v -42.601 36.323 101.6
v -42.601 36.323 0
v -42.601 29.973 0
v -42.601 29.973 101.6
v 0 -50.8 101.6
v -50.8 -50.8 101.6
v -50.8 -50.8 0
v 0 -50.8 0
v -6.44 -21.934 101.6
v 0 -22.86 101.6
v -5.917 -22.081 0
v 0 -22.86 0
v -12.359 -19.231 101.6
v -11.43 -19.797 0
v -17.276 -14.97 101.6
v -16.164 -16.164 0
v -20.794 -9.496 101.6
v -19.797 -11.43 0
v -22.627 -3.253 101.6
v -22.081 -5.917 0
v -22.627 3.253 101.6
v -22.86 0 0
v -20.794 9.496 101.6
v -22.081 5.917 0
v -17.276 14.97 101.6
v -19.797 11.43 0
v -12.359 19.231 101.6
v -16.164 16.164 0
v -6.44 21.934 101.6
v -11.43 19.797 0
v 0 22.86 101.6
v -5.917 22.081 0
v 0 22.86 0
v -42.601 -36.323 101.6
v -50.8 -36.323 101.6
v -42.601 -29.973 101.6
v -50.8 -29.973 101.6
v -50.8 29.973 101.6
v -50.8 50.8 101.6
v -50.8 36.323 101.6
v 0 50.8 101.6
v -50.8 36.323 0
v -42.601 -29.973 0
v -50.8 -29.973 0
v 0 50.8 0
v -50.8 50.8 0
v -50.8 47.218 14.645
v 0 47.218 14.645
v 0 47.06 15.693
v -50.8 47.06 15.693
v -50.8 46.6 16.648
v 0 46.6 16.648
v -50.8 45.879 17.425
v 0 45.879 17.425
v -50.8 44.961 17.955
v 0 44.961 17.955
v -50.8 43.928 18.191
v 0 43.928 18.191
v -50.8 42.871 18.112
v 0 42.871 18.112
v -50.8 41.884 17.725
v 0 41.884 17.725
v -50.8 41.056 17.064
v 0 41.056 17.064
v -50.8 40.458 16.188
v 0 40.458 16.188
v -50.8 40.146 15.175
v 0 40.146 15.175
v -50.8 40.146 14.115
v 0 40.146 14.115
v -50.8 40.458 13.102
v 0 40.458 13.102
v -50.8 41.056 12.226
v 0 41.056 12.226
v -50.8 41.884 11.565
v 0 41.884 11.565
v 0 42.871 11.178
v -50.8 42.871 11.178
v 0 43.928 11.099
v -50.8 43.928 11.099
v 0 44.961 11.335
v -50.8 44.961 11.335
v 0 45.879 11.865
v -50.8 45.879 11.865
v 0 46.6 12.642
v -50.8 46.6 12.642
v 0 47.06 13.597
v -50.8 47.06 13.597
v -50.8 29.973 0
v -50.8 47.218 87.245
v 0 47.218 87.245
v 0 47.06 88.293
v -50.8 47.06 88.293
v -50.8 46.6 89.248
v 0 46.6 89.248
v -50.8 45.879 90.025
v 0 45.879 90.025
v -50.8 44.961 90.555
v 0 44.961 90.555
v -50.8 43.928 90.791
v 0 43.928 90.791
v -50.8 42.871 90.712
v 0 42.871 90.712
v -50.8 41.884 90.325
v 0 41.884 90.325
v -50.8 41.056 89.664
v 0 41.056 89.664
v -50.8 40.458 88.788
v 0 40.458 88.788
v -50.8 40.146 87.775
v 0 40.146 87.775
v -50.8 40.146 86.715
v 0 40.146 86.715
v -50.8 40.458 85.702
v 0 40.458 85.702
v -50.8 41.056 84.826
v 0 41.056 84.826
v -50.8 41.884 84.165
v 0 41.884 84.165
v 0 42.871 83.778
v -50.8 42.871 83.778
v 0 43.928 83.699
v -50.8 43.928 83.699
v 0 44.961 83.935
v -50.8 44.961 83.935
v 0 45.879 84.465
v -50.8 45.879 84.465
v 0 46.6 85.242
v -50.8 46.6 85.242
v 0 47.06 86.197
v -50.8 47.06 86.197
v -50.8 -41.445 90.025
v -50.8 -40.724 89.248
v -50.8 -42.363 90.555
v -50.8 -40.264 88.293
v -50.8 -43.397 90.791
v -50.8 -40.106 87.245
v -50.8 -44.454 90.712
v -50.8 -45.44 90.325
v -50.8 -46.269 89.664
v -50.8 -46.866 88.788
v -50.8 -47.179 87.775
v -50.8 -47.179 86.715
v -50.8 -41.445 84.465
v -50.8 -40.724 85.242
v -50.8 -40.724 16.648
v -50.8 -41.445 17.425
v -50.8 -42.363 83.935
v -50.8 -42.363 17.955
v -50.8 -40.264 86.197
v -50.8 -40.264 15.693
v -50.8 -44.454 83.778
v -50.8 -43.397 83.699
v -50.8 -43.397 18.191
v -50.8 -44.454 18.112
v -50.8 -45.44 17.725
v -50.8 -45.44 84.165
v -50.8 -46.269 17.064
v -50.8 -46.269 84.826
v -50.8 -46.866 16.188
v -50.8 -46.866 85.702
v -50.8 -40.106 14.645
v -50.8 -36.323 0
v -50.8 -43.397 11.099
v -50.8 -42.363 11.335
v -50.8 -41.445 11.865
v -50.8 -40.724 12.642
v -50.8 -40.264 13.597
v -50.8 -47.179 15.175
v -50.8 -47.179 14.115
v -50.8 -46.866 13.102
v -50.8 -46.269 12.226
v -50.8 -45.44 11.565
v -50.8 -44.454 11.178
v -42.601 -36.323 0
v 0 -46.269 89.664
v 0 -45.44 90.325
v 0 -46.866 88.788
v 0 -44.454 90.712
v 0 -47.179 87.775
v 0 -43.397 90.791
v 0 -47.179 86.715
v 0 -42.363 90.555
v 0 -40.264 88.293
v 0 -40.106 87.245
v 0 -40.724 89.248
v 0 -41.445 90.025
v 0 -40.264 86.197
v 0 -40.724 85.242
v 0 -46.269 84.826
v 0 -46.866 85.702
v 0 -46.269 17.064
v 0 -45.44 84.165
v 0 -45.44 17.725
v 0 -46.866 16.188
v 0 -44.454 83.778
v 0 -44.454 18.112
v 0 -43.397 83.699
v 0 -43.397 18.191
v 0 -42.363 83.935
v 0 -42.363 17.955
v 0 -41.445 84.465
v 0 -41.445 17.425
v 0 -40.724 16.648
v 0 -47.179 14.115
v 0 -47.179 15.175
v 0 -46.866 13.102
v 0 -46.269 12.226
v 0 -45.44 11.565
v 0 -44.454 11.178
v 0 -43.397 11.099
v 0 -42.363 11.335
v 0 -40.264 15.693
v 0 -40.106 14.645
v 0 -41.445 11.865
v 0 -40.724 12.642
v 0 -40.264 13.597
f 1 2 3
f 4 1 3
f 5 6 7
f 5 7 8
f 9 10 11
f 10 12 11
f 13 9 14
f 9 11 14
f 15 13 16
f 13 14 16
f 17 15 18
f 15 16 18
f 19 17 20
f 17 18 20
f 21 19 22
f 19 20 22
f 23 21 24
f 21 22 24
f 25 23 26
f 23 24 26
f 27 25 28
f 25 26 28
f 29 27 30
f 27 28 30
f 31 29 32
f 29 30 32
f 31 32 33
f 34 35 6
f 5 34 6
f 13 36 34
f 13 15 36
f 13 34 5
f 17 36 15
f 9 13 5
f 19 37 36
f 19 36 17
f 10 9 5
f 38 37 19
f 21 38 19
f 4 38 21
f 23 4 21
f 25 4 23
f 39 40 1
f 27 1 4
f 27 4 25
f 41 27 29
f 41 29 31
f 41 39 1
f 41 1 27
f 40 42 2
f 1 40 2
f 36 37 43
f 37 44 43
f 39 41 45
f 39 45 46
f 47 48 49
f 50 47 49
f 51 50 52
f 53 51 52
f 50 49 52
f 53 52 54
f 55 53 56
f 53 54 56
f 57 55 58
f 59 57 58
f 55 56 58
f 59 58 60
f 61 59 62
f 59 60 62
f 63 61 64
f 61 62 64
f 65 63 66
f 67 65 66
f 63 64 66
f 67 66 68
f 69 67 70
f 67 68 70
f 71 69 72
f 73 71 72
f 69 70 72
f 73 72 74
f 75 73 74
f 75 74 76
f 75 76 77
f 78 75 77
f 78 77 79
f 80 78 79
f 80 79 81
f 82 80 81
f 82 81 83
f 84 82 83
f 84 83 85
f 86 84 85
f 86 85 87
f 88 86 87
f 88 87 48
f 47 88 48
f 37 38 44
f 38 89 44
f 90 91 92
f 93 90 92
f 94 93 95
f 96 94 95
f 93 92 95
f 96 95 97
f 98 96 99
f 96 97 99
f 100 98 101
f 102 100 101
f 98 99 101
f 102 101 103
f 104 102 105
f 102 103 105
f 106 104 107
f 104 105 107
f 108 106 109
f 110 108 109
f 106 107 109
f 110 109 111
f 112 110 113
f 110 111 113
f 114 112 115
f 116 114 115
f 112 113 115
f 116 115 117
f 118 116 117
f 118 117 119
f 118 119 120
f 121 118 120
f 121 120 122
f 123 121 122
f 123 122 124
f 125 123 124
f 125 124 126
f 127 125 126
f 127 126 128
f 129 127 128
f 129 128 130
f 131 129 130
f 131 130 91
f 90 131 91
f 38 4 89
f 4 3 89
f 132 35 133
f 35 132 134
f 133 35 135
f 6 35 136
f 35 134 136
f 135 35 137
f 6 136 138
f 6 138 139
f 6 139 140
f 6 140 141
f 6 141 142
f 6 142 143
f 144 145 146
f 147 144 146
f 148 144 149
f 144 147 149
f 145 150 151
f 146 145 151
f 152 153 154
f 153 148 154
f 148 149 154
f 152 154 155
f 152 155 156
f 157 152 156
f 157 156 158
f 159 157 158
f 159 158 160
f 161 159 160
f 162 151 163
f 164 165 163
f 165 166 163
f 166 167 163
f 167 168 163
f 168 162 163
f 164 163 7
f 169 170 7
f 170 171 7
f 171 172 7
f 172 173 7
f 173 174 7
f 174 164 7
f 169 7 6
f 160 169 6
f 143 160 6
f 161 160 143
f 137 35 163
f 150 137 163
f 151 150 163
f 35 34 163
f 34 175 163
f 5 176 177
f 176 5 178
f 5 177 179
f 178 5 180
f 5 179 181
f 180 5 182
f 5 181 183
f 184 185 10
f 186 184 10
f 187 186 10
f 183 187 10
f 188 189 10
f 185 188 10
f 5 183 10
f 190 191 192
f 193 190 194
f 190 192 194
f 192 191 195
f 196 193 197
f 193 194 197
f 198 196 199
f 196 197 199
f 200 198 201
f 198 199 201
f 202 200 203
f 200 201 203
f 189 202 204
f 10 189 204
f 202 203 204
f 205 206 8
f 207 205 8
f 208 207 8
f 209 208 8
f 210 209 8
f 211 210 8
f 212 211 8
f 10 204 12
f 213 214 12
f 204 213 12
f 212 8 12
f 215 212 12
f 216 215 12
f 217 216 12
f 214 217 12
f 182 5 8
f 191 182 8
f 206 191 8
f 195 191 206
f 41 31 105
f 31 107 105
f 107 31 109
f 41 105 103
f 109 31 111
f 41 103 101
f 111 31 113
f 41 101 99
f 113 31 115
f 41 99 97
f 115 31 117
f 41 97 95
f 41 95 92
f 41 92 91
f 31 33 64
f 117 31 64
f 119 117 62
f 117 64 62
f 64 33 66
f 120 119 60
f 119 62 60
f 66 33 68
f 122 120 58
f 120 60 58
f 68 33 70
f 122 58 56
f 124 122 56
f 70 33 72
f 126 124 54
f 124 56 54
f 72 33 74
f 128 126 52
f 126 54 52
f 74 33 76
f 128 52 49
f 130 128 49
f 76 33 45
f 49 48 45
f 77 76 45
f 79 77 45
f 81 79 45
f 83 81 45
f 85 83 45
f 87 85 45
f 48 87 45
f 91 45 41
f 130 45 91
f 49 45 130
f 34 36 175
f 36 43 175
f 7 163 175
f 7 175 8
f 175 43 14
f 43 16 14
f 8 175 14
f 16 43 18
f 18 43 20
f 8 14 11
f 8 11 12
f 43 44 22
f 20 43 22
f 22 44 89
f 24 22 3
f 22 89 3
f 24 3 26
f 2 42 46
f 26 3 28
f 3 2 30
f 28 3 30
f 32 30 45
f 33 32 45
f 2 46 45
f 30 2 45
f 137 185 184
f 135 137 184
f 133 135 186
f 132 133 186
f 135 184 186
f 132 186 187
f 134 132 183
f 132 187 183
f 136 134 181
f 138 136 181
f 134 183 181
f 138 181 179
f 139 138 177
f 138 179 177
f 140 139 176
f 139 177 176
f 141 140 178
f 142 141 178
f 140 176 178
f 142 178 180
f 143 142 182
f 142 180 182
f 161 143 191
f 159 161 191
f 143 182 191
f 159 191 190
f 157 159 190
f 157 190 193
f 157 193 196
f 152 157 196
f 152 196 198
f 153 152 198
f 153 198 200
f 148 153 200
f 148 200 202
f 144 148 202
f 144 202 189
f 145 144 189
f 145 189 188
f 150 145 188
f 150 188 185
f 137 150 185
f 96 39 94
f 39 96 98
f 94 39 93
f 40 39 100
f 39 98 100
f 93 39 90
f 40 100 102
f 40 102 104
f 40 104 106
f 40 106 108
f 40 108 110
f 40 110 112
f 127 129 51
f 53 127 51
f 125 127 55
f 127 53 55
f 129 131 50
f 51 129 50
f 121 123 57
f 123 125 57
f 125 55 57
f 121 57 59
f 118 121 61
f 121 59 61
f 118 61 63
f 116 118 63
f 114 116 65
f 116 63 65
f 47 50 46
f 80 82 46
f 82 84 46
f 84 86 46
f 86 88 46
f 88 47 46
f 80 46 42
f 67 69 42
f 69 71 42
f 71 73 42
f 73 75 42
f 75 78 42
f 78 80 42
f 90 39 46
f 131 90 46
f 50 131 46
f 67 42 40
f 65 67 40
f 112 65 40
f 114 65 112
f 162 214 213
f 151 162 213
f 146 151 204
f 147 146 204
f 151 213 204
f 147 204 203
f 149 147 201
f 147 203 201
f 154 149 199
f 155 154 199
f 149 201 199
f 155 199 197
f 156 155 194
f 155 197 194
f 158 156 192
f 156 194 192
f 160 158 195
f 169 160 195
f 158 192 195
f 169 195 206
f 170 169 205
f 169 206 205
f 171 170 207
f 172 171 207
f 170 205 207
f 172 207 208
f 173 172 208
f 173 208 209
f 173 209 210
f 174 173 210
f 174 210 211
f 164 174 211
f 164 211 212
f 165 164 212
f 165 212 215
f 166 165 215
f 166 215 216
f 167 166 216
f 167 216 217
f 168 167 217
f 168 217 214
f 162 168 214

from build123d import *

# Parameters (mm, degrees)
F1_DEPTH = 50.8
F2_DEPTH = 50.8
F4_D     = 7.112


with BuildPart() as f1:
    # F0 (on Top) → F1 (new body)
    with BuildSketch(Plane.XY):
        with BuildLine():
            Line((-50.8, 0), (-22.86, 0))
            ThreePointArc((-22.86, 0), (-16.164461, 16.164461), (0, 22.86))
            Line((0, 22.86), (0, 50.8))
            Line((0, 50.8), (-50.8, 50.8))
            Line((-50.8, 50.8), (-50.8, 36.323187))
            Line((-50.8, 36.323187), (-42.600878, 36.323187))
            Line((-42.600878, 36.323187), (-42.600878, 29.973187))
            Line((-42.600878, 29.973187), (-50.8, 29.973187))
            Line((-50.8, 29.973187), (-50.8, 0))
        make_face()
        with BuildLine():
            ThreePointArc((0, -22.86), (-16.164461, -16.164461), (-22.86, 0))
            Line((-22.86, 0), (-50.8, 0))
            Line((-50.8, 0), (-50.8, -29.973187))
            Line((-50.8, -29.973187), (-42.600878, -29.973187))
            Line((-42.600878, -29.973187), (-42.600878, -36.323187))
            Line((-42.600878, -36.323187), (-50.8, -36.323187))
            Line((-50.8, -36.323187), (-50.8, -50.8))
            Line((-50.8, -50.8), (0, -50.8))
            Line((0, -50.8), (0, -22.86))
        make_face()
    extrude(amount=F1_DEPTH)

    # F1_face (on face) → F2 (join)
    with BuildSketch(Plane(origin=(-27.91822, 0, 50.8), x_dir=(1, 0, 0), z_dir=(0, 0, 1))):
        with BuildLine():
            Line((-14.682658, 36.323187), (-14.682658, 29.973187))
            Line((-14.682658, 29.973187), (-22.88178, 29.973187))
            Line((-22.88178, 29.973187), (-22.88178, -29.973187))
            Line((-22.88178, -29.973187), (-14.682658, -29.973187))
            Line((-14.682658, -29.973187), (-14.682658, -36.323187))
            Line((-14.682658, -36.323187), (-22.88178, -36.323187))
            Line((-22.88178, -36.323187), (-22.88178, -50.8))
            Line((-22.88178, -50.8), (27.91822, -50.8))
            Line((27.91822, -50.8), (27.91822, -22.86))
            ThreePointArc((27.91822, -22.86), (5.05822, 0), (27.91822, 22.86))
            Line((27.91822, 22.86), (27.91822, 50.8))
            Line((27.91822, 50.8), (-22.88178, 50.8))
            Line((-22.88178, 50.8), (-22.88178, 36.323187))
            Line((-22.88178, 36.323187), (-14.682658, 36.323187))
        make_face()
    extrude(amount=F2_DEPTH)

    # F4 (through all)
    with Locations(Plane(origin=(-50.8, 0, 0), x_dir=(0, -1, 0), z_dir=(-1, 0, 0))):
        with Locations((-43.662325, 87.244935), (43.662325, 87.244935), (43.662325, 14.645034), (-43.662325, 14.645034)):
            Hole(F4_D / 2)


solid = f1.part
